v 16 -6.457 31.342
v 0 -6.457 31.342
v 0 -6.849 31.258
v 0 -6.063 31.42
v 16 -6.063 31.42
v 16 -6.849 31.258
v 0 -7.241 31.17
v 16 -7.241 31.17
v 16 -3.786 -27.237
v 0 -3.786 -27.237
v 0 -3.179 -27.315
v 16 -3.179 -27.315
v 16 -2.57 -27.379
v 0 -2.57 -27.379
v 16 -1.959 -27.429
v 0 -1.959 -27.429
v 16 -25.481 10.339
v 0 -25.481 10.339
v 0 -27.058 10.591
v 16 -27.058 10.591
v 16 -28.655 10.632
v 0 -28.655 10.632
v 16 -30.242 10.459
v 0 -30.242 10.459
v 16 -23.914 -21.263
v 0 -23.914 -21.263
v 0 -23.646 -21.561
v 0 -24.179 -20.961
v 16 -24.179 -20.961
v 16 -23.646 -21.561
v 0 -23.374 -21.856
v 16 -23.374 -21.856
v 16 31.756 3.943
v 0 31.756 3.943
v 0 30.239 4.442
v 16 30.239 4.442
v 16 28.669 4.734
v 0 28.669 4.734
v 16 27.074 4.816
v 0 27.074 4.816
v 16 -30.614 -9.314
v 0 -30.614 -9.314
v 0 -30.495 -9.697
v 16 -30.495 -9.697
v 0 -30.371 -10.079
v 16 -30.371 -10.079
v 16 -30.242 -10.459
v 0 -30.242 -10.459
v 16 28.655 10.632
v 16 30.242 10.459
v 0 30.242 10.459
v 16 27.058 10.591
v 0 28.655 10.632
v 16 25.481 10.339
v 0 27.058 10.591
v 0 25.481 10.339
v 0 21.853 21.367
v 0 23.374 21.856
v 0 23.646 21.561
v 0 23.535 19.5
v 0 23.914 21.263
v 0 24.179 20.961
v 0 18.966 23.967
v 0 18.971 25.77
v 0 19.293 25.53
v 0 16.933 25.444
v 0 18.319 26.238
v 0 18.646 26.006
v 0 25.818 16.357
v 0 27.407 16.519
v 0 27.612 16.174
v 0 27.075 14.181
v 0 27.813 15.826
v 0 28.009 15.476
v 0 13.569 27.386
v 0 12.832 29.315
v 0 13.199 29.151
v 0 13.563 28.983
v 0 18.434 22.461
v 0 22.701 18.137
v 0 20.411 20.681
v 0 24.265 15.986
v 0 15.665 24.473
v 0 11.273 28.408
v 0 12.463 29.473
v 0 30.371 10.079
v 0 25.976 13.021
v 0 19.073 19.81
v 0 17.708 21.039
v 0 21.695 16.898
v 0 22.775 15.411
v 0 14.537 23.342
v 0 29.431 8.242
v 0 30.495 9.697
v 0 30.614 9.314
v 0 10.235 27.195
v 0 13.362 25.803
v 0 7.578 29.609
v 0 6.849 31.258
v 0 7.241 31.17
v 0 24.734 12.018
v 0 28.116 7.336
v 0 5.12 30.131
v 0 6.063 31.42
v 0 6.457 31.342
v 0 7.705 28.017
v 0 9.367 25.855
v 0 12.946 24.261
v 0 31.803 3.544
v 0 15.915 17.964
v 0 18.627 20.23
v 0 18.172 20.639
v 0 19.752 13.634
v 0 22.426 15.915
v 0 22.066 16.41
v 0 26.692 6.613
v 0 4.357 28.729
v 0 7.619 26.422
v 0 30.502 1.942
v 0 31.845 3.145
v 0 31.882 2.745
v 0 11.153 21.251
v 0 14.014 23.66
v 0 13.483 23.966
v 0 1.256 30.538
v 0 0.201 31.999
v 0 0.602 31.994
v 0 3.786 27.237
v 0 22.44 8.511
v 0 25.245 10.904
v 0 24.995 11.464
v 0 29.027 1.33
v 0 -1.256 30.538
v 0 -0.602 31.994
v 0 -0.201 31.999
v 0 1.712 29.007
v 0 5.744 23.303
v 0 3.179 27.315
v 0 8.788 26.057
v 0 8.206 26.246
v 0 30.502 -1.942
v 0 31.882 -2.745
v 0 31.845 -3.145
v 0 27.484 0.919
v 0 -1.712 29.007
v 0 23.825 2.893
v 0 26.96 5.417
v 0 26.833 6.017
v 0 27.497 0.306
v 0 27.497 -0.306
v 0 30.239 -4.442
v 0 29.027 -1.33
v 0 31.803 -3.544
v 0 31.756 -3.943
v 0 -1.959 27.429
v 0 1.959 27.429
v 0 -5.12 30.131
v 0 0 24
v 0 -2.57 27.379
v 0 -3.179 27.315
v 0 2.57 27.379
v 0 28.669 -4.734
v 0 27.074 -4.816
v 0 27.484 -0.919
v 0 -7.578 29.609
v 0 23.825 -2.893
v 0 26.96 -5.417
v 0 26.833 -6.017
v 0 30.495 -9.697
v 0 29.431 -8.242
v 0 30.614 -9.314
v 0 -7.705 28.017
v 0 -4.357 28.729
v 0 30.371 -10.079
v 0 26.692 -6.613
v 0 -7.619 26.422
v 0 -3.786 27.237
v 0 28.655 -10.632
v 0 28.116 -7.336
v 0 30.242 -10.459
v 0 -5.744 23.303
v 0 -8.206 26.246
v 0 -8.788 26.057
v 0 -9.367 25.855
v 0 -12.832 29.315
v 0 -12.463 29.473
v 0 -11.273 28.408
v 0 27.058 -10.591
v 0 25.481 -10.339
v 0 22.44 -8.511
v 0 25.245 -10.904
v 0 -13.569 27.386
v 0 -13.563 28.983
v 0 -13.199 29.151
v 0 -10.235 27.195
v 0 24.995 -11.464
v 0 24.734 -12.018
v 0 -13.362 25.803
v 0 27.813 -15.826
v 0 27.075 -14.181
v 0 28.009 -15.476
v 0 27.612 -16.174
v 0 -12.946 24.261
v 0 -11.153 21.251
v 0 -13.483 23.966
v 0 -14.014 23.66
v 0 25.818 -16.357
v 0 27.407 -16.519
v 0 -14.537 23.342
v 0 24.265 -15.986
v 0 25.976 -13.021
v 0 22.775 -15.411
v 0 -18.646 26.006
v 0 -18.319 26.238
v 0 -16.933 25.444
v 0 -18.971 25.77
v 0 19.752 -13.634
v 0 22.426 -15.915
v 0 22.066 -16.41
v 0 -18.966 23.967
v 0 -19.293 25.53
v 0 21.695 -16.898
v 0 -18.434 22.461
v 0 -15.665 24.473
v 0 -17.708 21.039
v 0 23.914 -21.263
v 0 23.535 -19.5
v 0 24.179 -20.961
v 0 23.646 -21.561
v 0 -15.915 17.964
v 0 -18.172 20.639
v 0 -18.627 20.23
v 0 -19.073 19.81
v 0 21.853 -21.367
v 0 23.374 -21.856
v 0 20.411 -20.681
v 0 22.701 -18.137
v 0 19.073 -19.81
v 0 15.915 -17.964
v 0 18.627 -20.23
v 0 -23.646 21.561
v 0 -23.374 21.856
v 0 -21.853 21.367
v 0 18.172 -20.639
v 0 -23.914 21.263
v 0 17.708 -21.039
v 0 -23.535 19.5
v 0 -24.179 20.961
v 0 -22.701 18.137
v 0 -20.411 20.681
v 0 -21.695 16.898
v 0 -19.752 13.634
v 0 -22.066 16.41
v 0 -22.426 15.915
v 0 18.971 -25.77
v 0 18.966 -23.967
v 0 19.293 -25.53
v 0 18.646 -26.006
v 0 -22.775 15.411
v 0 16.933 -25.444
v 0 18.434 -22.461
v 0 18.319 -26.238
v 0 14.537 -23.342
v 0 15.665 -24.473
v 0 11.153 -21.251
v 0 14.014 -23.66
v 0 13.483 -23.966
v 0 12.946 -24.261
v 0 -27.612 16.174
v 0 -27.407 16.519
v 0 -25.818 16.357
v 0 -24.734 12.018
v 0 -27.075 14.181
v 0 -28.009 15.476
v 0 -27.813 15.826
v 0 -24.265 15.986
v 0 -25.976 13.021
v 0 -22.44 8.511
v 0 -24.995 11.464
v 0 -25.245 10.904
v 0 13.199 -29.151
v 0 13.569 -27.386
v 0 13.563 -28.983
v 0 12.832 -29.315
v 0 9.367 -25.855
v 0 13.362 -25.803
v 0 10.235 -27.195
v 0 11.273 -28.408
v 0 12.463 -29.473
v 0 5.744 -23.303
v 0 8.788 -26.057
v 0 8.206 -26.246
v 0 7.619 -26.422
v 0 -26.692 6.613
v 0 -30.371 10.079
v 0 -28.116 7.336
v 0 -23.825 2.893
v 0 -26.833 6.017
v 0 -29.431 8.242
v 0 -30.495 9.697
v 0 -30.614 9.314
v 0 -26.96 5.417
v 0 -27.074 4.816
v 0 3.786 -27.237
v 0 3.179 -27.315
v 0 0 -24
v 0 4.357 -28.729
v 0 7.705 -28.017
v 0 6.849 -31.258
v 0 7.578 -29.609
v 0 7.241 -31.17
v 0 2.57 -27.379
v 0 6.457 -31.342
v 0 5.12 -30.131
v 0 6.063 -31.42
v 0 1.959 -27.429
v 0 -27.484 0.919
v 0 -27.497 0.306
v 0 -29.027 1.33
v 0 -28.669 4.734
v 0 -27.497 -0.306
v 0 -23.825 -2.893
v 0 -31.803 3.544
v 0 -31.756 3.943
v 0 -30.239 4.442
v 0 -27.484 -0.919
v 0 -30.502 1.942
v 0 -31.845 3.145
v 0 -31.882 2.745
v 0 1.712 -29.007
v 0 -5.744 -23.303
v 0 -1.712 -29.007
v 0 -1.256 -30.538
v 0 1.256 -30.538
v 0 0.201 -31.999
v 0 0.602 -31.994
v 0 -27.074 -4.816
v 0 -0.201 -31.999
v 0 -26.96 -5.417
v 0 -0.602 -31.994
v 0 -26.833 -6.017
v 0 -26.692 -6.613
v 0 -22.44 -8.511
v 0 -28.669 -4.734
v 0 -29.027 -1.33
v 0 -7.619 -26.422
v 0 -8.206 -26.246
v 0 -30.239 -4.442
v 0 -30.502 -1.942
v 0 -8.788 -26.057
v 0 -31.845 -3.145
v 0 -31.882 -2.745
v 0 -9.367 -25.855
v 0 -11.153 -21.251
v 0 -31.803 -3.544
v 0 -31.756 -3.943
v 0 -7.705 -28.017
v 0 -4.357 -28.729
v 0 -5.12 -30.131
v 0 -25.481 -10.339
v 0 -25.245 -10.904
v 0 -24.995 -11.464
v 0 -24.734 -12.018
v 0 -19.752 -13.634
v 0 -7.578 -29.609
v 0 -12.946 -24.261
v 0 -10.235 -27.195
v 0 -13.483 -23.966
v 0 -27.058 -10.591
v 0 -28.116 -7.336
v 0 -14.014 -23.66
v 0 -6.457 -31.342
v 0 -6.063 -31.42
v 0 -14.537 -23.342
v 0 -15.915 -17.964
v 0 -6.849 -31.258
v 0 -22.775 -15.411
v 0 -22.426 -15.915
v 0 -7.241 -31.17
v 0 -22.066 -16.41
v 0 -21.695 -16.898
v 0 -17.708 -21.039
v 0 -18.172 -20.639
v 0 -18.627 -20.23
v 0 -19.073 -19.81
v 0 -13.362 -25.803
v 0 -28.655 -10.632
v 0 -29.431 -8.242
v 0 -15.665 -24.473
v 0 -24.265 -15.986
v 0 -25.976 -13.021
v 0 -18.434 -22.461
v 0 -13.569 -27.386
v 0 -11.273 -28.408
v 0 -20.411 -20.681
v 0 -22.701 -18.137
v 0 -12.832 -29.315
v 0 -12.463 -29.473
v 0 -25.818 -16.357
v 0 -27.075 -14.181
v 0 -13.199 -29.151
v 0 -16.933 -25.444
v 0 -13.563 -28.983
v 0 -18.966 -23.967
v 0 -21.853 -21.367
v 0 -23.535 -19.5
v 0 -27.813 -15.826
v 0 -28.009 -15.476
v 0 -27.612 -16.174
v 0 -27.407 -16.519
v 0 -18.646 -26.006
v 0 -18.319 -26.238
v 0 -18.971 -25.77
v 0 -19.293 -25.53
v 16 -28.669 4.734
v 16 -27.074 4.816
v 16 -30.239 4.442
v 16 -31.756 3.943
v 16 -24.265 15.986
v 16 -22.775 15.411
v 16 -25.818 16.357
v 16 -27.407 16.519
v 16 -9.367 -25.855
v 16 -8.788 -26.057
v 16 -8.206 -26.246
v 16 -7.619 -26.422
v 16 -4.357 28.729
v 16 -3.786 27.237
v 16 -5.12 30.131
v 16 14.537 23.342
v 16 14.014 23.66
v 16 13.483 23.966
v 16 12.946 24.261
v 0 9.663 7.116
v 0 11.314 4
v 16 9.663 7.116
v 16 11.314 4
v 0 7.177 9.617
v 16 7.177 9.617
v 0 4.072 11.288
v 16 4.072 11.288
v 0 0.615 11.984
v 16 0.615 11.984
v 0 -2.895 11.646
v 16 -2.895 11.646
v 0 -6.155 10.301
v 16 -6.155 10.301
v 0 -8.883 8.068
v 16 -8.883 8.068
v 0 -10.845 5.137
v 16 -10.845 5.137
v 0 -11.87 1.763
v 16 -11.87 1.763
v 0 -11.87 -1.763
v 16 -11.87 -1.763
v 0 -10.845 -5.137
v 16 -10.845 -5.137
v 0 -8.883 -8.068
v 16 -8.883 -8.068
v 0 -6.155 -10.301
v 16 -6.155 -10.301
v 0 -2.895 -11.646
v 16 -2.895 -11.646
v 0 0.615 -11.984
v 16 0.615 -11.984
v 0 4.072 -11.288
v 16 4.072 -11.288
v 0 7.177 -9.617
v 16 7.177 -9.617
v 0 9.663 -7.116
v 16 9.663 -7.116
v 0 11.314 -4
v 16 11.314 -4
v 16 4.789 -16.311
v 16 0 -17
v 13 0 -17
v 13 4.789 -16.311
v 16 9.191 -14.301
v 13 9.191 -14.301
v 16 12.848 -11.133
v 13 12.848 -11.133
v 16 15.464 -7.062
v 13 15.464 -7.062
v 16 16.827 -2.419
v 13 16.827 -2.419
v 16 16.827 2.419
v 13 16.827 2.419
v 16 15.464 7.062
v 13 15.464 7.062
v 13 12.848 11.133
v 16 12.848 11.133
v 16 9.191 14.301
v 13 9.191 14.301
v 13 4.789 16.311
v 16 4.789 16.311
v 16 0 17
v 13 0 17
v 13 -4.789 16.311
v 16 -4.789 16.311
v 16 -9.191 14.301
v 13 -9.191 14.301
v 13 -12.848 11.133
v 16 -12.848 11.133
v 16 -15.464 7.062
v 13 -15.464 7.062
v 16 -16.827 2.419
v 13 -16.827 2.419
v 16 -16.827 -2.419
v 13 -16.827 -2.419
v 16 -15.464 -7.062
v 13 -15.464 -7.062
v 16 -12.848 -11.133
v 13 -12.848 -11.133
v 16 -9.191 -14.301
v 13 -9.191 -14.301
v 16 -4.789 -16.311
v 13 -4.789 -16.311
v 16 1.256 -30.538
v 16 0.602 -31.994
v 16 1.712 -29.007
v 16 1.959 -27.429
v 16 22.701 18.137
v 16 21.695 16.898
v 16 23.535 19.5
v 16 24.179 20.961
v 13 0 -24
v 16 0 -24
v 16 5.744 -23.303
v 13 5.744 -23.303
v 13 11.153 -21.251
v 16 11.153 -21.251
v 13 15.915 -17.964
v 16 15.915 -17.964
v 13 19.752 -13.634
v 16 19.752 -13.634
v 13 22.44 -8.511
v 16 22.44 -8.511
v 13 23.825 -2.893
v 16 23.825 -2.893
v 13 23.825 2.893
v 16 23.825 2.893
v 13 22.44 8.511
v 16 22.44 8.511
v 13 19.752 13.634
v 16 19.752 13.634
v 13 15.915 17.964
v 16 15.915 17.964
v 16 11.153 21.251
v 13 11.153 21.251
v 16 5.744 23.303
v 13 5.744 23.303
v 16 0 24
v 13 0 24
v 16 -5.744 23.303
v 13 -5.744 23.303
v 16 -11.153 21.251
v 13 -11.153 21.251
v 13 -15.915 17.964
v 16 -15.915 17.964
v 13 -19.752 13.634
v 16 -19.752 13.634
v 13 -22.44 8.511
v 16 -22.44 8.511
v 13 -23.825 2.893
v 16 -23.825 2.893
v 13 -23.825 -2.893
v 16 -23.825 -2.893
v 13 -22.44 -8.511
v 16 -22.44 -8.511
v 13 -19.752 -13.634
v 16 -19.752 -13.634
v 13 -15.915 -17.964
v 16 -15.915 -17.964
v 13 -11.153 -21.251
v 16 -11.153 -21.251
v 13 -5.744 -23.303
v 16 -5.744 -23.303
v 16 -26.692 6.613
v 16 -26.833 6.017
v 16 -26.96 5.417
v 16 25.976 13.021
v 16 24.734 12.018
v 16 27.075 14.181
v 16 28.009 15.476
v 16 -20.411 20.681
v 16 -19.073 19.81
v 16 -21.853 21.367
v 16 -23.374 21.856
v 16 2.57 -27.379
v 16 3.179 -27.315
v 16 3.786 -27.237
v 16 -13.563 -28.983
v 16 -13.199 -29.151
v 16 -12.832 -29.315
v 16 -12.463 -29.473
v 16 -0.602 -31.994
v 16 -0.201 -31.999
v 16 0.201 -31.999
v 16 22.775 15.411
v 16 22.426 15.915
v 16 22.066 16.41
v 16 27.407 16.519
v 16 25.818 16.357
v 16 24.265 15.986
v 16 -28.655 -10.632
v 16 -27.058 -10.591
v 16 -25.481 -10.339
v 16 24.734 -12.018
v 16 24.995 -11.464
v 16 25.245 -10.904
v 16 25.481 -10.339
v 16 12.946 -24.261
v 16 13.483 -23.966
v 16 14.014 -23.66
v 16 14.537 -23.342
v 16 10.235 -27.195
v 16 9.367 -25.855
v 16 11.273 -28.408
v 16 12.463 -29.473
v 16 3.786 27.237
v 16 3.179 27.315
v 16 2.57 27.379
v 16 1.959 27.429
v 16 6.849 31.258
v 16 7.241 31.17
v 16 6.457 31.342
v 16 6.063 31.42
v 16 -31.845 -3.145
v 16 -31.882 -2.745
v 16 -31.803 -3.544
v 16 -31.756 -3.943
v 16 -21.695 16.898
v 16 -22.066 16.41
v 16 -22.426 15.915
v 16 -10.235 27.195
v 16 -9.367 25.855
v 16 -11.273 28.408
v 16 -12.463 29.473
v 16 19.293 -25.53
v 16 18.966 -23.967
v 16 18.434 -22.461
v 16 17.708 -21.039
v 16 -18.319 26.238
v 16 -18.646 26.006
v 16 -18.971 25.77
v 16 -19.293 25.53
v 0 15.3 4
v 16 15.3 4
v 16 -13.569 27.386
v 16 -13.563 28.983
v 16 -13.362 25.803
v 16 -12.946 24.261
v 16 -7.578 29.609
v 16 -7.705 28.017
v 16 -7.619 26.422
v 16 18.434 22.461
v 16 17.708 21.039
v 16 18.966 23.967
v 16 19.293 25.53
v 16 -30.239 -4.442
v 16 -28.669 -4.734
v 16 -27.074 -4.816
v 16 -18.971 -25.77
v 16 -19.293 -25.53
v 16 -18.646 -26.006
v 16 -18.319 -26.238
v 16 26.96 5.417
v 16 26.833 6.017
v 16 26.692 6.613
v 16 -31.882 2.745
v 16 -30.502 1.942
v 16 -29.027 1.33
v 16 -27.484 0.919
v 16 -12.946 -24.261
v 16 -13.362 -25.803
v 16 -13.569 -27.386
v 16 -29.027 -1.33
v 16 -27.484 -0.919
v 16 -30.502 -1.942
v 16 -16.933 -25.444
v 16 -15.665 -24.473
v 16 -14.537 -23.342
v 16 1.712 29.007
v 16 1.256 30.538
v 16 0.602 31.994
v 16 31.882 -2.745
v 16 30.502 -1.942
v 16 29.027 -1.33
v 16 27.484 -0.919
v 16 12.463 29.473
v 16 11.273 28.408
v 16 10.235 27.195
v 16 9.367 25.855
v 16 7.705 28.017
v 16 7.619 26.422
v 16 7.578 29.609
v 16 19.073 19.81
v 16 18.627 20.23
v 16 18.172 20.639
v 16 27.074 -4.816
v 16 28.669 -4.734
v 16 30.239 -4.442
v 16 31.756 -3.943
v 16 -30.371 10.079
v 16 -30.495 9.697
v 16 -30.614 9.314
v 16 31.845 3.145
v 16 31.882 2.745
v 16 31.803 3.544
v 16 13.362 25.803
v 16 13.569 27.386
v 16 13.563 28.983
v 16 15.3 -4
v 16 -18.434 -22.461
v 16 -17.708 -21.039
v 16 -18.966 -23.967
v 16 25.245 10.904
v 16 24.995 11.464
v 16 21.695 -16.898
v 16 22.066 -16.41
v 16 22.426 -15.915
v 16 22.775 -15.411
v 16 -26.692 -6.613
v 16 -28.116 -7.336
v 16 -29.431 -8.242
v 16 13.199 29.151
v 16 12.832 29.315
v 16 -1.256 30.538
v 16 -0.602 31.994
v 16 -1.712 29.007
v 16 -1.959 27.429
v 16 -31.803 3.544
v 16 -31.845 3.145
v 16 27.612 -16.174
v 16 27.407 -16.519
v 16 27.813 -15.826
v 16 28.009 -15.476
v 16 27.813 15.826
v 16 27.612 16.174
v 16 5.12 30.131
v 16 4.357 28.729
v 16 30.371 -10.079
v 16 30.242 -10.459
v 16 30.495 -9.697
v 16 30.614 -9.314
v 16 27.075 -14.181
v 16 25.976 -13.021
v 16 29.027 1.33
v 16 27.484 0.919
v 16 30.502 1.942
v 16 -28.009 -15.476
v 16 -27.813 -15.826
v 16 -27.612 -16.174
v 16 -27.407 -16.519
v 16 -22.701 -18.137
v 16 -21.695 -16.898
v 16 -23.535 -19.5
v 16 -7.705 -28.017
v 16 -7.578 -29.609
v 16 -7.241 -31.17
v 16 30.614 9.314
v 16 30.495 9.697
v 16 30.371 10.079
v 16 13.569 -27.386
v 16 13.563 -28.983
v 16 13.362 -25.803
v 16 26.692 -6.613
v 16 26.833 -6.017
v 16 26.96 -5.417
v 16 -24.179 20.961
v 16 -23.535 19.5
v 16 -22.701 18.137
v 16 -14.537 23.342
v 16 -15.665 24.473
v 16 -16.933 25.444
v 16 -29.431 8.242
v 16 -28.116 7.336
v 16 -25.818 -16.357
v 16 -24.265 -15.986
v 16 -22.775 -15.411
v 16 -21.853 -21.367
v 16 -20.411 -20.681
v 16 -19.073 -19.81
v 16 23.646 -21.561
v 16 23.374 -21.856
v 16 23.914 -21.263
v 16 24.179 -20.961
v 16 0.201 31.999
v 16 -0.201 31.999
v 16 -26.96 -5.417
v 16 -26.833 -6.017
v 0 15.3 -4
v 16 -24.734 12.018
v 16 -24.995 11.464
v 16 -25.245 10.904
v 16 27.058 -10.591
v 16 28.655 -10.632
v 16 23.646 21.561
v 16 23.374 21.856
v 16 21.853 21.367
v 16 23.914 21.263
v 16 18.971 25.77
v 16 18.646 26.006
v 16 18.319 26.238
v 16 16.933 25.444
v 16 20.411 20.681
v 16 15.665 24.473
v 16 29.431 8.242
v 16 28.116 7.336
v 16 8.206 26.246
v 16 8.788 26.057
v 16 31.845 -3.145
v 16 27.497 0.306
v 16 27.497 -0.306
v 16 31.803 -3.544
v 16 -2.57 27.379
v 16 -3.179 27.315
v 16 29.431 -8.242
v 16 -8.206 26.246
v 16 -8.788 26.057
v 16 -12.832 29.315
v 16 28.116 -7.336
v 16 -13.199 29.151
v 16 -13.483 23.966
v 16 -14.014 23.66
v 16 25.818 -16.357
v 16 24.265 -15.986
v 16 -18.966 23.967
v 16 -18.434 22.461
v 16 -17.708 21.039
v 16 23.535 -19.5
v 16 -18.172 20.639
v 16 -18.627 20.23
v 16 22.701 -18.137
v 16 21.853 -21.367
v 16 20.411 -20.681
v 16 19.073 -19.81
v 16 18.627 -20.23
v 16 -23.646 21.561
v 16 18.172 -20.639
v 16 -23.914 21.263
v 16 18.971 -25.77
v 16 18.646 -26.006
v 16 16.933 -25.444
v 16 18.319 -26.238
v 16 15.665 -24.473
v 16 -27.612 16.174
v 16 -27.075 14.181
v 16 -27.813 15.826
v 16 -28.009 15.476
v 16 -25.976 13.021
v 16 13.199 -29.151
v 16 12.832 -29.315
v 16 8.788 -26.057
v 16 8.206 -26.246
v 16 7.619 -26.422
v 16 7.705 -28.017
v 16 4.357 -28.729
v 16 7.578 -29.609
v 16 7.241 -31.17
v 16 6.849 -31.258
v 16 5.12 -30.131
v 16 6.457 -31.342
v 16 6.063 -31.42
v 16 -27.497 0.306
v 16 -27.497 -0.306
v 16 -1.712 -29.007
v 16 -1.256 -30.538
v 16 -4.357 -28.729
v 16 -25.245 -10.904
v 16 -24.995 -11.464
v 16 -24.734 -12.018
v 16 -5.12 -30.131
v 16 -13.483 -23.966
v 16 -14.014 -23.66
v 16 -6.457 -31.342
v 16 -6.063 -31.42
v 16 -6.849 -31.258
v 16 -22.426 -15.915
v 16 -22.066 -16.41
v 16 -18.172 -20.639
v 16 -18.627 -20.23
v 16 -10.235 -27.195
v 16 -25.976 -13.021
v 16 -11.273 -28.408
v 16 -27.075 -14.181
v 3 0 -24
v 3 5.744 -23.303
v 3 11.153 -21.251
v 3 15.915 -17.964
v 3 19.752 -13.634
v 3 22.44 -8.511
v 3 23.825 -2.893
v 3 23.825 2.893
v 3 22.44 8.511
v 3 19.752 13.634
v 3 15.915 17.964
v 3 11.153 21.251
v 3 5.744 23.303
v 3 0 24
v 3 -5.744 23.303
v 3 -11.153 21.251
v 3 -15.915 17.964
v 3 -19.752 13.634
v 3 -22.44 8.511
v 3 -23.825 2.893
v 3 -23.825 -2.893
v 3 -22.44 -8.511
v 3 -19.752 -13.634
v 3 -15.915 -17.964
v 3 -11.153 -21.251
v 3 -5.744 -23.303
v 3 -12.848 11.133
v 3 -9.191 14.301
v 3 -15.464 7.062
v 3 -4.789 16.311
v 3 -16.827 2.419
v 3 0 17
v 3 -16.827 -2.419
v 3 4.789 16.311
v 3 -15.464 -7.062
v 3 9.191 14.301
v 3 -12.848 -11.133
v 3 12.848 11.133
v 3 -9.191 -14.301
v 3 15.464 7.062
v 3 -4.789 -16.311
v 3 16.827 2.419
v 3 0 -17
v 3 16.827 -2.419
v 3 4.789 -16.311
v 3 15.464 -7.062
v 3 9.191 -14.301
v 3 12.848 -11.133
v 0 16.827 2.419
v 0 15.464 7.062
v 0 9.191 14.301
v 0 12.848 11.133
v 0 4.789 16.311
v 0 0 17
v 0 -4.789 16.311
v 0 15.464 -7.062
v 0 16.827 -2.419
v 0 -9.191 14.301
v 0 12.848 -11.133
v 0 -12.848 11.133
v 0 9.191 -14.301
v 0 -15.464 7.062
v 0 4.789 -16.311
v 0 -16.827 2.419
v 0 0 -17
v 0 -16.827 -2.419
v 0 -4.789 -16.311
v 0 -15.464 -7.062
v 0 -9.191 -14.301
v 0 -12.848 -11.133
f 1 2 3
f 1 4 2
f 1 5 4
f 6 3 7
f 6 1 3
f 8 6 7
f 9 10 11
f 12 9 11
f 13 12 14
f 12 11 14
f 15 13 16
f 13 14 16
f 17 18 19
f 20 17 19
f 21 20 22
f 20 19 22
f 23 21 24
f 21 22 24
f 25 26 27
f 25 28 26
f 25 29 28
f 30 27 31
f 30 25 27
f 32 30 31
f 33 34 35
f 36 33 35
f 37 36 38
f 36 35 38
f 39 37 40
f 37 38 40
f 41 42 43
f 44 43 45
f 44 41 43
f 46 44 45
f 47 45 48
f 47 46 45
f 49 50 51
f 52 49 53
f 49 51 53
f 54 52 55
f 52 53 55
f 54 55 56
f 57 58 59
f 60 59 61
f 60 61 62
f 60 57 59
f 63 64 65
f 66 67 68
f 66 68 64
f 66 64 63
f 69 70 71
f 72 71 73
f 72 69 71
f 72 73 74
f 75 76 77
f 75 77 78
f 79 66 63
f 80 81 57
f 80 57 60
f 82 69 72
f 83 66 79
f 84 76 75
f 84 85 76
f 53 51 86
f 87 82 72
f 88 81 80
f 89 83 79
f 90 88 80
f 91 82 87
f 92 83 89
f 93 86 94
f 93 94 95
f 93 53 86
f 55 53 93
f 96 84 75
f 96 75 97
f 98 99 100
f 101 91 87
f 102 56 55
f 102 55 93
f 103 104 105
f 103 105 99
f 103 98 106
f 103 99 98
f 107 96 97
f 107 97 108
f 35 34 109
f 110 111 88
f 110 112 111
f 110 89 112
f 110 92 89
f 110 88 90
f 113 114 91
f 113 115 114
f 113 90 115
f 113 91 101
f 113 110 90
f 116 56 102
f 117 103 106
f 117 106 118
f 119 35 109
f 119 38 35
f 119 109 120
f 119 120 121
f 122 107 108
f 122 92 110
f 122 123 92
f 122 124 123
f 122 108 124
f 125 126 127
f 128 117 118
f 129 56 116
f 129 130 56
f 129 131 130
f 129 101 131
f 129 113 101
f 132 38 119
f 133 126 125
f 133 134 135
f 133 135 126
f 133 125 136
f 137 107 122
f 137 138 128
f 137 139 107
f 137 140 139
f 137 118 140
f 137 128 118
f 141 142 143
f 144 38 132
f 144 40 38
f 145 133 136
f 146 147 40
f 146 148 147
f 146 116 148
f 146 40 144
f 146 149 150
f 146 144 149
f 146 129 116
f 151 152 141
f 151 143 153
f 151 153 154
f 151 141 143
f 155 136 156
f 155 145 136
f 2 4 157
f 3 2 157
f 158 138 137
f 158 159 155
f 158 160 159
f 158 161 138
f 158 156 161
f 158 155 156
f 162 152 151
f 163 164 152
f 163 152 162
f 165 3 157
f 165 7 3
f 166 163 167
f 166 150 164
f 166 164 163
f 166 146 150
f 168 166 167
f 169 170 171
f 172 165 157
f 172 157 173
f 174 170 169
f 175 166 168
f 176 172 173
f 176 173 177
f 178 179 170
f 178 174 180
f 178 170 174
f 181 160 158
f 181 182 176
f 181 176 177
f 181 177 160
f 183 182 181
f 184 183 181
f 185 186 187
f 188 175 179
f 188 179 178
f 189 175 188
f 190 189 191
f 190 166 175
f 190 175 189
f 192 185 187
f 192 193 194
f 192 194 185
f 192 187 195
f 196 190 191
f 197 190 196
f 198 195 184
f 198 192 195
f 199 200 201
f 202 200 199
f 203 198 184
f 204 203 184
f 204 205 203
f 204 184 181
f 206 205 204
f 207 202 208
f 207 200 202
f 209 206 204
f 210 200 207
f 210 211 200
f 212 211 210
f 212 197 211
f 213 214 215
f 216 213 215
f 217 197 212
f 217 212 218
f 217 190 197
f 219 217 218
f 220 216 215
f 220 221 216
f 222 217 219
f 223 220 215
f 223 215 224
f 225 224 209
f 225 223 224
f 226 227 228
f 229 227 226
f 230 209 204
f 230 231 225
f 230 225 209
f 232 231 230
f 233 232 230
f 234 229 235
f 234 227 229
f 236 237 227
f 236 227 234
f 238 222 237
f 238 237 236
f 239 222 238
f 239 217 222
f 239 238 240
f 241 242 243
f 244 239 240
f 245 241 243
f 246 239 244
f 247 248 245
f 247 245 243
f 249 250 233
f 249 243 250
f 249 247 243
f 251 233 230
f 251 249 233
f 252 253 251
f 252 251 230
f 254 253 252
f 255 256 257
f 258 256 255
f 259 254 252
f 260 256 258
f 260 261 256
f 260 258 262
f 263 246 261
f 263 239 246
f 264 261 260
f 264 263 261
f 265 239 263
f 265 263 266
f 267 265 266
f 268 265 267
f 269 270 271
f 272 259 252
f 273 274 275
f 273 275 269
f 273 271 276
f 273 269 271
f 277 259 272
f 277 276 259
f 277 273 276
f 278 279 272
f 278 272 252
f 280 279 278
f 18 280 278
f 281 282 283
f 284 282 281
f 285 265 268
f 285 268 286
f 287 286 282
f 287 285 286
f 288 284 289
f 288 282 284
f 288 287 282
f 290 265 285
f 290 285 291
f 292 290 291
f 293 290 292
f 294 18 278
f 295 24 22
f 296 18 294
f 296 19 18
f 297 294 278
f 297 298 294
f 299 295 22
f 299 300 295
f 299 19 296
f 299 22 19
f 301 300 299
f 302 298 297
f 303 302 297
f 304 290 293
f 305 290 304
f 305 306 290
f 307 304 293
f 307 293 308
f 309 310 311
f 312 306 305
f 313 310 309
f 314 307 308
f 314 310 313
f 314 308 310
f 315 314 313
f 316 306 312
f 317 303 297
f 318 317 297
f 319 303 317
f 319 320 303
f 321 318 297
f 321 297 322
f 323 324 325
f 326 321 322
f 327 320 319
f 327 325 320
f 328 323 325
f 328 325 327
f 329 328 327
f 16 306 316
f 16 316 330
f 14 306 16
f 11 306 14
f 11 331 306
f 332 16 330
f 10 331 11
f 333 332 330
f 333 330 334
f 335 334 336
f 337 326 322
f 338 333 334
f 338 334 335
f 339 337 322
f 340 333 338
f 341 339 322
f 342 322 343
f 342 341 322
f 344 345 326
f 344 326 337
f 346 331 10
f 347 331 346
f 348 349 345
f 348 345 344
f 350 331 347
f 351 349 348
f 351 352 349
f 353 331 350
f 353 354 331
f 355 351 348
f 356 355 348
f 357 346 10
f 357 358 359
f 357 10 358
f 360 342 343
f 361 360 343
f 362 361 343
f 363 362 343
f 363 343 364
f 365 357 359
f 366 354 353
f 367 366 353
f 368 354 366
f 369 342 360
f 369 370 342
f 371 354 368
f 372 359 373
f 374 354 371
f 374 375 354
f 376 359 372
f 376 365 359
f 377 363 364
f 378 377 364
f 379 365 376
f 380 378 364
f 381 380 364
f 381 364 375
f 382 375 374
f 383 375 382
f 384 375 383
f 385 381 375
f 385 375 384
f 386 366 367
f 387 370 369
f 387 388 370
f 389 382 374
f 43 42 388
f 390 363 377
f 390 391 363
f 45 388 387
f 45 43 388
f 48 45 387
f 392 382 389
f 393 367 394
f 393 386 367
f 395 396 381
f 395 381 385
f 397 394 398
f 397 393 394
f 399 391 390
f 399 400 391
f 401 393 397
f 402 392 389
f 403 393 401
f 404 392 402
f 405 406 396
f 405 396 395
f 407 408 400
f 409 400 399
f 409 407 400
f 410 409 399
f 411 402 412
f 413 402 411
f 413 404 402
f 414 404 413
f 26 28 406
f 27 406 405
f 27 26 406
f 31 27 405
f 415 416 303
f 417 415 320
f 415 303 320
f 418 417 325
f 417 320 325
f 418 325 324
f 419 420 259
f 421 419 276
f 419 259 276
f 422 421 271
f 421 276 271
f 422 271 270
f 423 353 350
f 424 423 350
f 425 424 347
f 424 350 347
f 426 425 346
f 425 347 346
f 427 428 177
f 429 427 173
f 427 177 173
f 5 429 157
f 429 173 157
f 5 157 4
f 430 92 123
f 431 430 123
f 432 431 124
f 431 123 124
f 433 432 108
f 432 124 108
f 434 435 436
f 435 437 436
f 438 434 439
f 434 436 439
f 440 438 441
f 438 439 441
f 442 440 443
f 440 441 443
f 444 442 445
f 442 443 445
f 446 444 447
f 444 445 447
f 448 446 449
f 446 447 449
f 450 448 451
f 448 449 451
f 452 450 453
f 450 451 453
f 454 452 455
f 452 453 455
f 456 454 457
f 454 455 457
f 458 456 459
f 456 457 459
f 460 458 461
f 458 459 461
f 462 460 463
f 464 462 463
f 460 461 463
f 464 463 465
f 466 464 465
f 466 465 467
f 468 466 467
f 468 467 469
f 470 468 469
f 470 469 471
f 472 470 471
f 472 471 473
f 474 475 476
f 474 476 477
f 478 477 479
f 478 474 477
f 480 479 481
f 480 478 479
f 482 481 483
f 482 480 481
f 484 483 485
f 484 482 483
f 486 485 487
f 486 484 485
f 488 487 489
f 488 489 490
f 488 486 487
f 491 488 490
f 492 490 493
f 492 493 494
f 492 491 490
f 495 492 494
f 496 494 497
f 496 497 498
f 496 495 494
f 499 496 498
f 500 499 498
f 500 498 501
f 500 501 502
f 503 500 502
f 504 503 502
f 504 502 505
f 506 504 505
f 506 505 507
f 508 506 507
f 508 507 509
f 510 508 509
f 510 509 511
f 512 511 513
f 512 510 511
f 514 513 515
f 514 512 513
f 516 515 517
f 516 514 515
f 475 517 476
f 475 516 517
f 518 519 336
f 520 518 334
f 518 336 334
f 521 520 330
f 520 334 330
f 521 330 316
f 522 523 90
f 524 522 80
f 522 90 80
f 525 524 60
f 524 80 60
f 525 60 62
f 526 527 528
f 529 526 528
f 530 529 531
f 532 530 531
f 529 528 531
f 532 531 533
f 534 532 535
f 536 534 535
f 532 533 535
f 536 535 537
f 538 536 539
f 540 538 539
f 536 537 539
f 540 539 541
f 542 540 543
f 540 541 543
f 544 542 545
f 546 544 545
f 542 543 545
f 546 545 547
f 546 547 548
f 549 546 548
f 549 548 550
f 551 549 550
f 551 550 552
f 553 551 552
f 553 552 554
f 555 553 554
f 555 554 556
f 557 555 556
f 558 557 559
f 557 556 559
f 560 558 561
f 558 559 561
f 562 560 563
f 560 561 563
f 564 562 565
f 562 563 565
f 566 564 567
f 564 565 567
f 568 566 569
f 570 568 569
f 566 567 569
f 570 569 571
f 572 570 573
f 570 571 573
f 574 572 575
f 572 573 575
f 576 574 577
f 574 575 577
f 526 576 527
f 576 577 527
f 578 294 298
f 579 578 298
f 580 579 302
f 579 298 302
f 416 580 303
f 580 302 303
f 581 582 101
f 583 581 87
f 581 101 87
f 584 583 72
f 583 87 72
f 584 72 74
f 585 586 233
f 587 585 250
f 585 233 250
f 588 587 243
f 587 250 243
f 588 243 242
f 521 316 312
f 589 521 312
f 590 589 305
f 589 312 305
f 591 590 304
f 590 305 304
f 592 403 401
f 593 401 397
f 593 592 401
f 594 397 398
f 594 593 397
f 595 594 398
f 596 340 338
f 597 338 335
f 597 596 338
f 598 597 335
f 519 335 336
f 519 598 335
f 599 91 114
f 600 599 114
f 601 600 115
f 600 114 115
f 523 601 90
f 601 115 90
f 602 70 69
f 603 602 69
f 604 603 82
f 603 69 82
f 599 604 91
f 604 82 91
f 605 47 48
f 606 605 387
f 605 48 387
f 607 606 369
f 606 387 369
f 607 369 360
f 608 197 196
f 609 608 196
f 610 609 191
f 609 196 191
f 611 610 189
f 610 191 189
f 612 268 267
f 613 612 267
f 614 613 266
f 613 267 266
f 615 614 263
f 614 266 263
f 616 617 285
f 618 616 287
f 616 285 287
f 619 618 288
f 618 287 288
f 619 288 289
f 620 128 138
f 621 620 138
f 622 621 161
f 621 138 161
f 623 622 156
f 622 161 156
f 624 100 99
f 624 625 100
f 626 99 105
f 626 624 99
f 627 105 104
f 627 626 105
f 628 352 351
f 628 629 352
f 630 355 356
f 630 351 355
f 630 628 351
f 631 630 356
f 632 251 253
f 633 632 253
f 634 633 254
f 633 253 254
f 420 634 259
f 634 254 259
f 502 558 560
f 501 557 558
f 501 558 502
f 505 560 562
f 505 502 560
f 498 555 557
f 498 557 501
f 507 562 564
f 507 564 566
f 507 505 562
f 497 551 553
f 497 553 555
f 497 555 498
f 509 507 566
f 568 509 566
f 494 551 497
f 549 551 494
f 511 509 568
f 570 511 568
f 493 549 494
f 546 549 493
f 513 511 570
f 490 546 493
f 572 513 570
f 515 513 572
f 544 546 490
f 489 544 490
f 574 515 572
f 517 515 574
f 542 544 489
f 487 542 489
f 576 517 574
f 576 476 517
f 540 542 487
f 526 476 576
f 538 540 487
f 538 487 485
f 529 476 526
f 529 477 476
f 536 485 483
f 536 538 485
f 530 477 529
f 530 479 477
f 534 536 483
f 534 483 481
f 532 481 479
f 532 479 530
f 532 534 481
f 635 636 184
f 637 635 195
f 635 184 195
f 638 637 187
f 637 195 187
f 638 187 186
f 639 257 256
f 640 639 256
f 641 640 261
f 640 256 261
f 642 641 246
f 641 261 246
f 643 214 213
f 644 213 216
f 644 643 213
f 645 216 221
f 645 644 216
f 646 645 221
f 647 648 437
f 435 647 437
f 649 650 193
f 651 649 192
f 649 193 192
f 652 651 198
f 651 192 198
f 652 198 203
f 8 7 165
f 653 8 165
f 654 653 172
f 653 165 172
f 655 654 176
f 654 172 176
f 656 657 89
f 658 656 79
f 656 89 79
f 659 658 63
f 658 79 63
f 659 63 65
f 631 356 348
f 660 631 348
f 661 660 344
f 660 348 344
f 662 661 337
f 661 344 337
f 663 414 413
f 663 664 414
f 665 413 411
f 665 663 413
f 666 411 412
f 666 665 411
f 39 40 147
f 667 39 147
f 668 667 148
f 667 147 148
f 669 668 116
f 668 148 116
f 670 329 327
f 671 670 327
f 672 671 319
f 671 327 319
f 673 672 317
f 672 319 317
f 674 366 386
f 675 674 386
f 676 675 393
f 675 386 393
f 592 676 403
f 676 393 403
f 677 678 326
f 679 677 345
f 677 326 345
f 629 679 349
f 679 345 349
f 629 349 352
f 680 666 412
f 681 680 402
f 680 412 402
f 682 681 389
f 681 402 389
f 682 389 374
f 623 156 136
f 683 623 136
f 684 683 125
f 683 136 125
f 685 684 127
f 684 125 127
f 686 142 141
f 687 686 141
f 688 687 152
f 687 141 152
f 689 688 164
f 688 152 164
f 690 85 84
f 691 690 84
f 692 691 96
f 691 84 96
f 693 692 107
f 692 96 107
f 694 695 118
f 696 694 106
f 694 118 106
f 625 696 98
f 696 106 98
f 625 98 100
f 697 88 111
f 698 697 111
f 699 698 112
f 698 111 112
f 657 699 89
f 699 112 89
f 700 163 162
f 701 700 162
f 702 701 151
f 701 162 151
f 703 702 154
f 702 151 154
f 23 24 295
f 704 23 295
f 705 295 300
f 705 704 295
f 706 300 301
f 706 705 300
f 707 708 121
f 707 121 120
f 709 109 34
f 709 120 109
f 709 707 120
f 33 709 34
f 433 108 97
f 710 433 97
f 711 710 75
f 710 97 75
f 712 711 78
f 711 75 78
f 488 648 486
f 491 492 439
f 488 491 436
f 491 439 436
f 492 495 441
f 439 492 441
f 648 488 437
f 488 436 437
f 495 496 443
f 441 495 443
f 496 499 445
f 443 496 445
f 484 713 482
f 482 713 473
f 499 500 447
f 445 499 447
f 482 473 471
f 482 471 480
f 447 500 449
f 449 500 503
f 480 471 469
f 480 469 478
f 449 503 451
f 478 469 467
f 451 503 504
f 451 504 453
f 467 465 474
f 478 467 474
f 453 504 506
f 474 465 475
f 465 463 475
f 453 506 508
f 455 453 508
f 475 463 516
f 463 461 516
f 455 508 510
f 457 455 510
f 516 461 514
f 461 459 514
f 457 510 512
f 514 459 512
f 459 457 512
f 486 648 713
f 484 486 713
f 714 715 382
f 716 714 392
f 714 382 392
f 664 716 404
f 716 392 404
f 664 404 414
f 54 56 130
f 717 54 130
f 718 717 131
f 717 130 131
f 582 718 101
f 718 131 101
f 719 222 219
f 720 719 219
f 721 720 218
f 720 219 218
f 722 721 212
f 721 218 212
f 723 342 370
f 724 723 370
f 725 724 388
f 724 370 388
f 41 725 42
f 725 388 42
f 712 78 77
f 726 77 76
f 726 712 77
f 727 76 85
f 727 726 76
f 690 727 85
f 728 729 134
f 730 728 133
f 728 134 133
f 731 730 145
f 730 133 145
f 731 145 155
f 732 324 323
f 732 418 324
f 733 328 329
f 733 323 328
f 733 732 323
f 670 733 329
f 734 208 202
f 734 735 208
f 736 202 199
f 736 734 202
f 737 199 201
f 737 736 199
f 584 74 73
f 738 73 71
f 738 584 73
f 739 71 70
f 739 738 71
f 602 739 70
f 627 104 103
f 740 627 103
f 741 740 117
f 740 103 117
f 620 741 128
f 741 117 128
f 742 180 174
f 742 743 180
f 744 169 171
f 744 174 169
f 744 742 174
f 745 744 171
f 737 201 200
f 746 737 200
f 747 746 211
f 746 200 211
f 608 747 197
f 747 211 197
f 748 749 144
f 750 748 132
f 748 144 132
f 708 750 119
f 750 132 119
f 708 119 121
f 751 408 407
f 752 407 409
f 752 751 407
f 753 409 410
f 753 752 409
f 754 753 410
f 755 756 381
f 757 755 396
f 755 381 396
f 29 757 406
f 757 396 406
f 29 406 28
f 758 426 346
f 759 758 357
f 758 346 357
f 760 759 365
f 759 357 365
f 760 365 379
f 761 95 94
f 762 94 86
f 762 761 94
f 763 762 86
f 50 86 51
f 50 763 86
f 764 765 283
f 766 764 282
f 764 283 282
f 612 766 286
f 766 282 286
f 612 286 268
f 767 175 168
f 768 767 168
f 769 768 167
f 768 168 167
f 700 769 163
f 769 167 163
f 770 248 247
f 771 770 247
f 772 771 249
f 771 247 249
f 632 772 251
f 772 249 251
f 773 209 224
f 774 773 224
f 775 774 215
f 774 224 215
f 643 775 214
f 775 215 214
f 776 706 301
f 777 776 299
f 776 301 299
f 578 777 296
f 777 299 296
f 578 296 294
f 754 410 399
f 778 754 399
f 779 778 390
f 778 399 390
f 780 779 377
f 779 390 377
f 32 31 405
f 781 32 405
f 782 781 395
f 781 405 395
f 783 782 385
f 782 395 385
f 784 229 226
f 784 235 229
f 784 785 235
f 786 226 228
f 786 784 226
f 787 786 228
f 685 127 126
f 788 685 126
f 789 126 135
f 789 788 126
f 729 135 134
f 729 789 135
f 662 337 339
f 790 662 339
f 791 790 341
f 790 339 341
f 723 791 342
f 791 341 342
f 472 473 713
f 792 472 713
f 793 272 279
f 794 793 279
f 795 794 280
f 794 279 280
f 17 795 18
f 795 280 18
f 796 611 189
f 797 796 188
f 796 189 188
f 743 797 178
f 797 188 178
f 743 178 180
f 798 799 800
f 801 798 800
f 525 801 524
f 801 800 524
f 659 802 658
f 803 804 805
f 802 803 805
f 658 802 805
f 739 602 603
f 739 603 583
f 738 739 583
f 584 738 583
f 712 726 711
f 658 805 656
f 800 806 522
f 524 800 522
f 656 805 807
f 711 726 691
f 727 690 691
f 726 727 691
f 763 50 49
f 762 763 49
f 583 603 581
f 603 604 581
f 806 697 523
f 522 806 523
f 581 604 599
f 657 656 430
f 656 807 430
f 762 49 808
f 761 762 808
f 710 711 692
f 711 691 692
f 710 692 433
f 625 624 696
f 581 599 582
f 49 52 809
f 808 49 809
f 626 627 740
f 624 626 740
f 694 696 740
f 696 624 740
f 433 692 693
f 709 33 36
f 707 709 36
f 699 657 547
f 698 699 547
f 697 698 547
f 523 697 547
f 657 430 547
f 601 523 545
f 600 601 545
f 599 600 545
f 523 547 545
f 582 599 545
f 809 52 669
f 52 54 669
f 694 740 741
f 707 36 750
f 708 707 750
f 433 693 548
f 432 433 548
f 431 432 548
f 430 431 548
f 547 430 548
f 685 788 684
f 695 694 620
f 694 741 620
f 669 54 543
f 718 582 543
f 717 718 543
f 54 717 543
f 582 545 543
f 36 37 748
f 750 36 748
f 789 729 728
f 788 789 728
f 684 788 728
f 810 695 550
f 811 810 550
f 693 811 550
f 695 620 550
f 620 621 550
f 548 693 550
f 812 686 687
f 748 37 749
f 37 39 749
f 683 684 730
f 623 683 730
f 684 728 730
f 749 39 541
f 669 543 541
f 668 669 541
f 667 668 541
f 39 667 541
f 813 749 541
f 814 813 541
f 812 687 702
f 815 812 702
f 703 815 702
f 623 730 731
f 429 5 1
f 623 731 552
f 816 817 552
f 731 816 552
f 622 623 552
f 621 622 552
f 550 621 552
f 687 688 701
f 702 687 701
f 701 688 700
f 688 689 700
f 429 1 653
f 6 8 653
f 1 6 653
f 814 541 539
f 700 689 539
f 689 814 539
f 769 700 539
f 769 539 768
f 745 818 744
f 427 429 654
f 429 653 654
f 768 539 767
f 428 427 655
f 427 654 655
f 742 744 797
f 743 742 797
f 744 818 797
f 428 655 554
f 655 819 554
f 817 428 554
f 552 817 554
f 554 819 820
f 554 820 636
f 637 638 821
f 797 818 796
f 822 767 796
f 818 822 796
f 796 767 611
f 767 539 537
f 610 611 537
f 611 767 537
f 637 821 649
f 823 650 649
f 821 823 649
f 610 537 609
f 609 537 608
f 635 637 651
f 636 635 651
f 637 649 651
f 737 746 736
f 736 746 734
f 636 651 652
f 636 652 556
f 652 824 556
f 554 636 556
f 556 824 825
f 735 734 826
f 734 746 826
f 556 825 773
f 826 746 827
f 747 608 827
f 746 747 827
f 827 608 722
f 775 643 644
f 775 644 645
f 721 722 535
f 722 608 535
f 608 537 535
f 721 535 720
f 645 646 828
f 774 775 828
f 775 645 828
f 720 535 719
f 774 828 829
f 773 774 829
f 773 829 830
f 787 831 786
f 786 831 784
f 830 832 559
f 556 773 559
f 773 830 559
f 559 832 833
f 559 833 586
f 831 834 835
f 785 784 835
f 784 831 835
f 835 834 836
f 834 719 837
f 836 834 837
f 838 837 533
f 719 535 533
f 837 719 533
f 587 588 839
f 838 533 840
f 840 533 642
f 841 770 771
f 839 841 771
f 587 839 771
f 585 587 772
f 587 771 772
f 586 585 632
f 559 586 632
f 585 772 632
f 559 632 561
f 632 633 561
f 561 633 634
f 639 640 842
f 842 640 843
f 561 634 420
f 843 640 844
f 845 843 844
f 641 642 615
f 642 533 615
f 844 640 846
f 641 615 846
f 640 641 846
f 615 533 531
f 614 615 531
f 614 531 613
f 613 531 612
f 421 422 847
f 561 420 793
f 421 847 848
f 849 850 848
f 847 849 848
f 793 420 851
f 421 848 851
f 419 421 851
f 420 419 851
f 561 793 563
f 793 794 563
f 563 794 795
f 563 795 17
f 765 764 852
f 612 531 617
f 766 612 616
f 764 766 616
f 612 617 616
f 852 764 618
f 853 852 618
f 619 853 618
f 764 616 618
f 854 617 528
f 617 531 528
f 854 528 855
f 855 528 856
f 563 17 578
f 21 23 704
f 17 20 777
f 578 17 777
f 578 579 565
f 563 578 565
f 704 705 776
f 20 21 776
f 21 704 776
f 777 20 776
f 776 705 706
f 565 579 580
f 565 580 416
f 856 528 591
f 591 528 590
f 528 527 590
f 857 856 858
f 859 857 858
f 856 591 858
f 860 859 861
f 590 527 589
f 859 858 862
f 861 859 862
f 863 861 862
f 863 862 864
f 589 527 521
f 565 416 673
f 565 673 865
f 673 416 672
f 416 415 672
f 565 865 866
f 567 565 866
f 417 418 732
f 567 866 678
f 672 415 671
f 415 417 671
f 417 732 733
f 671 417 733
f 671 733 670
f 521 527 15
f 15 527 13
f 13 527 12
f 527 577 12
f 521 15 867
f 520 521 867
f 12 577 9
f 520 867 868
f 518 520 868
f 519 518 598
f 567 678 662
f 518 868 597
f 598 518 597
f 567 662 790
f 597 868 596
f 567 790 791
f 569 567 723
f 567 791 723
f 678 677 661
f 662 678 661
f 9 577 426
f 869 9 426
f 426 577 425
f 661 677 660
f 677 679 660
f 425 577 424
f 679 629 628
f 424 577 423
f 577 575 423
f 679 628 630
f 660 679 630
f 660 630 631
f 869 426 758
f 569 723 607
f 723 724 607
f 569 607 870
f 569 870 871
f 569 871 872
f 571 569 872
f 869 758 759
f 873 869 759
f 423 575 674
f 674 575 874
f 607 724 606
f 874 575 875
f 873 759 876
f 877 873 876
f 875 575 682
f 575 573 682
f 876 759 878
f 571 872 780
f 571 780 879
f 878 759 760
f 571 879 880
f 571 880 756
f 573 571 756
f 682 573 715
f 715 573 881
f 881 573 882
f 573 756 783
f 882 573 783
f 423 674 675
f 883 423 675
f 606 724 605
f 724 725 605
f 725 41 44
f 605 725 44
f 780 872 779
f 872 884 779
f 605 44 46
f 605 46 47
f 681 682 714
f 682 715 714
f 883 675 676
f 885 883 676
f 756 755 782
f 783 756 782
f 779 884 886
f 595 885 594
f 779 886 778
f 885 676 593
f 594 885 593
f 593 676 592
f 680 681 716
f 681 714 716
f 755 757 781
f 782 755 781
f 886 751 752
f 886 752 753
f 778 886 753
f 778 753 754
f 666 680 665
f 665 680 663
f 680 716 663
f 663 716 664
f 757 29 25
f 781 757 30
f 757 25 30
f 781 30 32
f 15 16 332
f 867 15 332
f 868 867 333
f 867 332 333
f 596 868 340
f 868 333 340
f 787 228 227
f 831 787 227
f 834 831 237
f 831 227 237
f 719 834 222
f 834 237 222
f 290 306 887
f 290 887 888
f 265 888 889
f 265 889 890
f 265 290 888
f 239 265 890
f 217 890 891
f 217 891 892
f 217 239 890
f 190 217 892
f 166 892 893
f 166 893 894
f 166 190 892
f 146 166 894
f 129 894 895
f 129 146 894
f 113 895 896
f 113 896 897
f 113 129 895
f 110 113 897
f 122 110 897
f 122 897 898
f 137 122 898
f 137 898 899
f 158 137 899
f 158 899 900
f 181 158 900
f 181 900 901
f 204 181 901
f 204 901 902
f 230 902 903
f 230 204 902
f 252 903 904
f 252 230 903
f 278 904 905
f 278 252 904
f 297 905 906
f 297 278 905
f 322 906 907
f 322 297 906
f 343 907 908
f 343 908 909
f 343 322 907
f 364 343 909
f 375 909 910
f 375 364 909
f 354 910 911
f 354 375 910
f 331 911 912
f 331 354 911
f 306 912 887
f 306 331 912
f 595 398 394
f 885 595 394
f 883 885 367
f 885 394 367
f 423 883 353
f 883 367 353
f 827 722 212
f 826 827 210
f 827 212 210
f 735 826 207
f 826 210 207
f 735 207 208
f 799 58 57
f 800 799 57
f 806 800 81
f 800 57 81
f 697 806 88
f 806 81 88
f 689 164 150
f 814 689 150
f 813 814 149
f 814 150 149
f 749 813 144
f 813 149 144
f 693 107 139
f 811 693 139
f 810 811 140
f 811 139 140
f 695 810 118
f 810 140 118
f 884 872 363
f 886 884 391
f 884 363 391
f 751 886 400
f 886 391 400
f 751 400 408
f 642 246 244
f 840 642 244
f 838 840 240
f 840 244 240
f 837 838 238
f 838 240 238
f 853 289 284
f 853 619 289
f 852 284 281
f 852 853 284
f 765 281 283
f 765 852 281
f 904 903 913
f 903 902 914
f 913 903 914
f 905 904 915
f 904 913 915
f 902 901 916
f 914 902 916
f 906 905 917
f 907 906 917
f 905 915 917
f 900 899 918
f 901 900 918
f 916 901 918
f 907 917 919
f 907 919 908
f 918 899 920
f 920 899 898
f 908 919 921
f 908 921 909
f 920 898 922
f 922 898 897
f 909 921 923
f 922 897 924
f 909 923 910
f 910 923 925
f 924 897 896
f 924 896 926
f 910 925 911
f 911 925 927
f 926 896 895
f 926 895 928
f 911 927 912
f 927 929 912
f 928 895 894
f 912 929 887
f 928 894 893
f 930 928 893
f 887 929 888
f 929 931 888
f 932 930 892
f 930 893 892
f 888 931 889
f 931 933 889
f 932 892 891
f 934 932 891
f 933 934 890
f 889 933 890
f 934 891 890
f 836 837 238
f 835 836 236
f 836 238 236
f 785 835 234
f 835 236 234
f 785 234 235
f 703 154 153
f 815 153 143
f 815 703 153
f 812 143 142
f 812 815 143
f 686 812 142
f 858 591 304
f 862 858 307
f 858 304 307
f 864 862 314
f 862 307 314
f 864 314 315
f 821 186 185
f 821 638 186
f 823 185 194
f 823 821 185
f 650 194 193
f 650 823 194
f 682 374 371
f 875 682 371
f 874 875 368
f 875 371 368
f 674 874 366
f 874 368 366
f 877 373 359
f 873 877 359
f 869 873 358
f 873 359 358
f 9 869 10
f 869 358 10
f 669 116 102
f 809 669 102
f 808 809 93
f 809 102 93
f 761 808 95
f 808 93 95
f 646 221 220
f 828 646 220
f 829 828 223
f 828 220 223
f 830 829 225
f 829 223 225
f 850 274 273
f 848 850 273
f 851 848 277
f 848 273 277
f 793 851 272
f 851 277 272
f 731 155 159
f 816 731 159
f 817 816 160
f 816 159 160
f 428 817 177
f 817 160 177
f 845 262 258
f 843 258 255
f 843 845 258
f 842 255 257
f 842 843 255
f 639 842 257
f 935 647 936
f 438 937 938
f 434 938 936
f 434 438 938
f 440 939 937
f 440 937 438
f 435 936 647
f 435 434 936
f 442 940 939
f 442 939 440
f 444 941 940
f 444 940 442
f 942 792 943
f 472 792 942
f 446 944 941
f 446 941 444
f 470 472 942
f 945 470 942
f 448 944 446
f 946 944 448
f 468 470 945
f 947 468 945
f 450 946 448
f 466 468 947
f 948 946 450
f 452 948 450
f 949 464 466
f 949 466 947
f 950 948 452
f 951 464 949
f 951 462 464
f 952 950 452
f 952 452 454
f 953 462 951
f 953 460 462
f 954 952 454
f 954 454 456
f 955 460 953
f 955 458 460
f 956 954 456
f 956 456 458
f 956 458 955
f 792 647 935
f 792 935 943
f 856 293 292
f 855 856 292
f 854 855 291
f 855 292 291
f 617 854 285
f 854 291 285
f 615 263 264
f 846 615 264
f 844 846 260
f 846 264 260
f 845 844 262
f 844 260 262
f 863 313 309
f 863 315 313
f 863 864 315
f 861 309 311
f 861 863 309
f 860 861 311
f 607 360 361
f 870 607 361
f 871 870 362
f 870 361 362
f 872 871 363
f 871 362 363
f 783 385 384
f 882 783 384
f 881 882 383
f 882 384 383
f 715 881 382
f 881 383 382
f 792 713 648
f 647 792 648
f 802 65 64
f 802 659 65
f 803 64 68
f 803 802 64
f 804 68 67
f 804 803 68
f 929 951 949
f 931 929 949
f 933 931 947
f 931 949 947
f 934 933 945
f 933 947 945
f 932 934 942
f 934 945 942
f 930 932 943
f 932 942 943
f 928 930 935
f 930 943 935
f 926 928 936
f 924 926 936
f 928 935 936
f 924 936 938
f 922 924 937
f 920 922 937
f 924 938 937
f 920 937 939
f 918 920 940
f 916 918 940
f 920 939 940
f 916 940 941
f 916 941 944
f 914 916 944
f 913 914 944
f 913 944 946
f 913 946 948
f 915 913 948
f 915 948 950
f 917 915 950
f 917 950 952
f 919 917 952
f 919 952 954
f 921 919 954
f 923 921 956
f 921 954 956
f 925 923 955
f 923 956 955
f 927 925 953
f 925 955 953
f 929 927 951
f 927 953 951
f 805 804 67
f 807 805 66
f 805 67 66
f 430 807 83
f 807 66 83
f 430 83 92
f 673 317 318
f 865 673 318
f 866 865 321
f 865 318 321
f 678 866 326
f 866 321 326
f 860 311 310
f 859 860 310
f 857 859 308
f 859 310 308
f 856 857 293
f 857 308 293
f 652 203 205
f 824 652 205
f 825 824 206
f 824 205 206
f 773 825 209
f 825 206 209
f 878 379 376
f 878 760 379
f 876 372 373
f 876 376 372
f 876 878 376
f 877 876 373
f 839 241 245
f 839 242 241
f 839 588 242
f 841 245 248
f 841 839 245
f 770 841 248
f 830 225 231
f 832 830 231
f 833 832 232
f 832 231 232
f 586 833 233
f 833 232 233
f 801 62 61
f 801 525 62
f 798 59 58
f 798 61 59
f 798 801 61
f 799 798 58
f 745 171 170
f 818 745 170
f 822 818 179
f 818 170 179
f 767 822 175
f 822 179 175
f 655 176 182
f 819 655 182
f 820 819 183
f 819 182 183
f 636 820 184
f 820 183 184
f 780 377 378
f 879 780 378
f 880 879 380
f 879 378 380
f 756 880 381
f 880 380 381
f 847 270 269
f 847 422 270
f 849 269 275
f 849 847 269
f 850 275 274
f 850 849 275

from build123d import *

# Parameters (mm, degrees)
BASPROSKE_W              = 16
BASPROSKE_H              = 32
TOOTHCUT_DEPTH           = 49
TEETHCUTS_COUNT          = 30
TEETHCUTS_ANGLE          = 348
BORSKE_R                 = 12
BORE_DEPTH               = 50.0000508
SCHIZZO1_R               = 24
SCHIZZO1_R_2             = 17
TAGLIO_ESTRUSIONE1_DEPTH = 3
TAGLIO_ESTRUSIONE2_DEPTH = 48.921417629


with BuildPart() as part:
    # BasProSke → Base-Revolve (revolve)
    with BuildSketch(Plane(origin=(0, 0, 0), x_dir=(1, 0, 0), z_dir=(0, 1, 0)), mode=Mode.PRIVATE) as base_revolve_sk:
        with Locations((8, 16)):
            Rectangle(BASPROSKE_W, BASPROSKE_H)
    revolve(base_revolve_sk.sketch.rotate(Axis((-10, 0, 0), (1, 0, 0)), 180), axis=Axis((-10, 0, 0), (1, 0, 0)))

    # TooCutSke → ToothCut (cut, through all)
    with BuildSketch(Plane(origin=(0, 0, 0), x_dir=(0, 0, -1), z_dir=(1, 0, 0))):
        with BuildLine():
            ThreePointArc((0.918551563, 27.483654488), (0, 27.499), (-0.918551563, 27.483654488))
            ThreePointArc((-0.918551563, 27.483654488), (-1.617208176, 29.787801627), (-2.761784709, 31.906093311))
            ThreePointArc((-2.761784709, 31.906093311), (0, 32.0254), (2.761784709, 31.906093311))
            ThreePointArc((2.761784709, 31.906093311), (1.617208176, 29.787801627), (0.918551563, 27.483654488))
        make_face()
    toothcut = extrude(amount=TOOTHCUT_DEPTH, mode=Mode.SUBTRACT)

    # TeethCuts: ToothCut ×30 about axis
    teethcuts_axis = Axis((-10, 0, 0), (1, 0, 0))
    for i in range(1, TEETHCUTS_COUNT):
        add(toothcut.rotate(teethcuts_axis, i * TEETHCUTS_ANGLE / (TEETHCUTS_COUNT - 1)), mode=Mode.SUBTRACT)

    # BorSke → Bore (cut, symmetric)
    with BuildSketch(Plane(origin=(0, 0, 0), x_dir=(0, 0, -1), z_dir=(1, 0, 0))):
        with Locations(Location((0, 0, 0), (0, 0, 180))):
            Circle(BORSKE_R)
    extrude(amount=BORE_DEPTH, both=True, mode=Mode.SUBTRACT)

    # Schizzo1 → Taglio-Estrusione1 (cut)
    with BuildSketch(Plane(origin=(16, 0, 0), x_dir=(0, 0, -1), z_dir=(1, 0, 0))):
        Circle(SCHIZZO1_R)
        Circle(SCHIZZO1_R_2, mode=Mode.SUBTRACT)
    taglio_estrusione1 = extrude(amount=-TAGLIO_ESTRUSIONE1_DEPTH, mode=Mode.SUBTRACT)

    # Specchia1: Taglio-Estrusione1 across plane
    add(taglio_estrusione1.mirror(Plane(origin=(8, 0, 0), x_dir=(0, 0, 1), z_dir=(1, 0, 0))), mode=Mode.SUBTRACT)

    # Schizzo2 → Taglio-Estrusione2 (cut, through all)
    with BuildSketch(Plane(origin=(16, 0, 0), x_dir=(0, 0, -1), z_dir=(1, 0, 0))):
        with BuildLine():
            Line((4, 15.3), (-4, 15.3))
            Line((-4, 15.3), (-4, 11.313708499))
            ThreePointArc((-4, 11.313708499), (0, 12), (4, 11.313708499))
            Line((4, 11.313708499), (4, 15.3))
        make_face()
    extrude(amount=-TAGLIO_ESTRUSIONE2_DEPTH, mode=Mode.SUBTRACT)


solid = part.part
